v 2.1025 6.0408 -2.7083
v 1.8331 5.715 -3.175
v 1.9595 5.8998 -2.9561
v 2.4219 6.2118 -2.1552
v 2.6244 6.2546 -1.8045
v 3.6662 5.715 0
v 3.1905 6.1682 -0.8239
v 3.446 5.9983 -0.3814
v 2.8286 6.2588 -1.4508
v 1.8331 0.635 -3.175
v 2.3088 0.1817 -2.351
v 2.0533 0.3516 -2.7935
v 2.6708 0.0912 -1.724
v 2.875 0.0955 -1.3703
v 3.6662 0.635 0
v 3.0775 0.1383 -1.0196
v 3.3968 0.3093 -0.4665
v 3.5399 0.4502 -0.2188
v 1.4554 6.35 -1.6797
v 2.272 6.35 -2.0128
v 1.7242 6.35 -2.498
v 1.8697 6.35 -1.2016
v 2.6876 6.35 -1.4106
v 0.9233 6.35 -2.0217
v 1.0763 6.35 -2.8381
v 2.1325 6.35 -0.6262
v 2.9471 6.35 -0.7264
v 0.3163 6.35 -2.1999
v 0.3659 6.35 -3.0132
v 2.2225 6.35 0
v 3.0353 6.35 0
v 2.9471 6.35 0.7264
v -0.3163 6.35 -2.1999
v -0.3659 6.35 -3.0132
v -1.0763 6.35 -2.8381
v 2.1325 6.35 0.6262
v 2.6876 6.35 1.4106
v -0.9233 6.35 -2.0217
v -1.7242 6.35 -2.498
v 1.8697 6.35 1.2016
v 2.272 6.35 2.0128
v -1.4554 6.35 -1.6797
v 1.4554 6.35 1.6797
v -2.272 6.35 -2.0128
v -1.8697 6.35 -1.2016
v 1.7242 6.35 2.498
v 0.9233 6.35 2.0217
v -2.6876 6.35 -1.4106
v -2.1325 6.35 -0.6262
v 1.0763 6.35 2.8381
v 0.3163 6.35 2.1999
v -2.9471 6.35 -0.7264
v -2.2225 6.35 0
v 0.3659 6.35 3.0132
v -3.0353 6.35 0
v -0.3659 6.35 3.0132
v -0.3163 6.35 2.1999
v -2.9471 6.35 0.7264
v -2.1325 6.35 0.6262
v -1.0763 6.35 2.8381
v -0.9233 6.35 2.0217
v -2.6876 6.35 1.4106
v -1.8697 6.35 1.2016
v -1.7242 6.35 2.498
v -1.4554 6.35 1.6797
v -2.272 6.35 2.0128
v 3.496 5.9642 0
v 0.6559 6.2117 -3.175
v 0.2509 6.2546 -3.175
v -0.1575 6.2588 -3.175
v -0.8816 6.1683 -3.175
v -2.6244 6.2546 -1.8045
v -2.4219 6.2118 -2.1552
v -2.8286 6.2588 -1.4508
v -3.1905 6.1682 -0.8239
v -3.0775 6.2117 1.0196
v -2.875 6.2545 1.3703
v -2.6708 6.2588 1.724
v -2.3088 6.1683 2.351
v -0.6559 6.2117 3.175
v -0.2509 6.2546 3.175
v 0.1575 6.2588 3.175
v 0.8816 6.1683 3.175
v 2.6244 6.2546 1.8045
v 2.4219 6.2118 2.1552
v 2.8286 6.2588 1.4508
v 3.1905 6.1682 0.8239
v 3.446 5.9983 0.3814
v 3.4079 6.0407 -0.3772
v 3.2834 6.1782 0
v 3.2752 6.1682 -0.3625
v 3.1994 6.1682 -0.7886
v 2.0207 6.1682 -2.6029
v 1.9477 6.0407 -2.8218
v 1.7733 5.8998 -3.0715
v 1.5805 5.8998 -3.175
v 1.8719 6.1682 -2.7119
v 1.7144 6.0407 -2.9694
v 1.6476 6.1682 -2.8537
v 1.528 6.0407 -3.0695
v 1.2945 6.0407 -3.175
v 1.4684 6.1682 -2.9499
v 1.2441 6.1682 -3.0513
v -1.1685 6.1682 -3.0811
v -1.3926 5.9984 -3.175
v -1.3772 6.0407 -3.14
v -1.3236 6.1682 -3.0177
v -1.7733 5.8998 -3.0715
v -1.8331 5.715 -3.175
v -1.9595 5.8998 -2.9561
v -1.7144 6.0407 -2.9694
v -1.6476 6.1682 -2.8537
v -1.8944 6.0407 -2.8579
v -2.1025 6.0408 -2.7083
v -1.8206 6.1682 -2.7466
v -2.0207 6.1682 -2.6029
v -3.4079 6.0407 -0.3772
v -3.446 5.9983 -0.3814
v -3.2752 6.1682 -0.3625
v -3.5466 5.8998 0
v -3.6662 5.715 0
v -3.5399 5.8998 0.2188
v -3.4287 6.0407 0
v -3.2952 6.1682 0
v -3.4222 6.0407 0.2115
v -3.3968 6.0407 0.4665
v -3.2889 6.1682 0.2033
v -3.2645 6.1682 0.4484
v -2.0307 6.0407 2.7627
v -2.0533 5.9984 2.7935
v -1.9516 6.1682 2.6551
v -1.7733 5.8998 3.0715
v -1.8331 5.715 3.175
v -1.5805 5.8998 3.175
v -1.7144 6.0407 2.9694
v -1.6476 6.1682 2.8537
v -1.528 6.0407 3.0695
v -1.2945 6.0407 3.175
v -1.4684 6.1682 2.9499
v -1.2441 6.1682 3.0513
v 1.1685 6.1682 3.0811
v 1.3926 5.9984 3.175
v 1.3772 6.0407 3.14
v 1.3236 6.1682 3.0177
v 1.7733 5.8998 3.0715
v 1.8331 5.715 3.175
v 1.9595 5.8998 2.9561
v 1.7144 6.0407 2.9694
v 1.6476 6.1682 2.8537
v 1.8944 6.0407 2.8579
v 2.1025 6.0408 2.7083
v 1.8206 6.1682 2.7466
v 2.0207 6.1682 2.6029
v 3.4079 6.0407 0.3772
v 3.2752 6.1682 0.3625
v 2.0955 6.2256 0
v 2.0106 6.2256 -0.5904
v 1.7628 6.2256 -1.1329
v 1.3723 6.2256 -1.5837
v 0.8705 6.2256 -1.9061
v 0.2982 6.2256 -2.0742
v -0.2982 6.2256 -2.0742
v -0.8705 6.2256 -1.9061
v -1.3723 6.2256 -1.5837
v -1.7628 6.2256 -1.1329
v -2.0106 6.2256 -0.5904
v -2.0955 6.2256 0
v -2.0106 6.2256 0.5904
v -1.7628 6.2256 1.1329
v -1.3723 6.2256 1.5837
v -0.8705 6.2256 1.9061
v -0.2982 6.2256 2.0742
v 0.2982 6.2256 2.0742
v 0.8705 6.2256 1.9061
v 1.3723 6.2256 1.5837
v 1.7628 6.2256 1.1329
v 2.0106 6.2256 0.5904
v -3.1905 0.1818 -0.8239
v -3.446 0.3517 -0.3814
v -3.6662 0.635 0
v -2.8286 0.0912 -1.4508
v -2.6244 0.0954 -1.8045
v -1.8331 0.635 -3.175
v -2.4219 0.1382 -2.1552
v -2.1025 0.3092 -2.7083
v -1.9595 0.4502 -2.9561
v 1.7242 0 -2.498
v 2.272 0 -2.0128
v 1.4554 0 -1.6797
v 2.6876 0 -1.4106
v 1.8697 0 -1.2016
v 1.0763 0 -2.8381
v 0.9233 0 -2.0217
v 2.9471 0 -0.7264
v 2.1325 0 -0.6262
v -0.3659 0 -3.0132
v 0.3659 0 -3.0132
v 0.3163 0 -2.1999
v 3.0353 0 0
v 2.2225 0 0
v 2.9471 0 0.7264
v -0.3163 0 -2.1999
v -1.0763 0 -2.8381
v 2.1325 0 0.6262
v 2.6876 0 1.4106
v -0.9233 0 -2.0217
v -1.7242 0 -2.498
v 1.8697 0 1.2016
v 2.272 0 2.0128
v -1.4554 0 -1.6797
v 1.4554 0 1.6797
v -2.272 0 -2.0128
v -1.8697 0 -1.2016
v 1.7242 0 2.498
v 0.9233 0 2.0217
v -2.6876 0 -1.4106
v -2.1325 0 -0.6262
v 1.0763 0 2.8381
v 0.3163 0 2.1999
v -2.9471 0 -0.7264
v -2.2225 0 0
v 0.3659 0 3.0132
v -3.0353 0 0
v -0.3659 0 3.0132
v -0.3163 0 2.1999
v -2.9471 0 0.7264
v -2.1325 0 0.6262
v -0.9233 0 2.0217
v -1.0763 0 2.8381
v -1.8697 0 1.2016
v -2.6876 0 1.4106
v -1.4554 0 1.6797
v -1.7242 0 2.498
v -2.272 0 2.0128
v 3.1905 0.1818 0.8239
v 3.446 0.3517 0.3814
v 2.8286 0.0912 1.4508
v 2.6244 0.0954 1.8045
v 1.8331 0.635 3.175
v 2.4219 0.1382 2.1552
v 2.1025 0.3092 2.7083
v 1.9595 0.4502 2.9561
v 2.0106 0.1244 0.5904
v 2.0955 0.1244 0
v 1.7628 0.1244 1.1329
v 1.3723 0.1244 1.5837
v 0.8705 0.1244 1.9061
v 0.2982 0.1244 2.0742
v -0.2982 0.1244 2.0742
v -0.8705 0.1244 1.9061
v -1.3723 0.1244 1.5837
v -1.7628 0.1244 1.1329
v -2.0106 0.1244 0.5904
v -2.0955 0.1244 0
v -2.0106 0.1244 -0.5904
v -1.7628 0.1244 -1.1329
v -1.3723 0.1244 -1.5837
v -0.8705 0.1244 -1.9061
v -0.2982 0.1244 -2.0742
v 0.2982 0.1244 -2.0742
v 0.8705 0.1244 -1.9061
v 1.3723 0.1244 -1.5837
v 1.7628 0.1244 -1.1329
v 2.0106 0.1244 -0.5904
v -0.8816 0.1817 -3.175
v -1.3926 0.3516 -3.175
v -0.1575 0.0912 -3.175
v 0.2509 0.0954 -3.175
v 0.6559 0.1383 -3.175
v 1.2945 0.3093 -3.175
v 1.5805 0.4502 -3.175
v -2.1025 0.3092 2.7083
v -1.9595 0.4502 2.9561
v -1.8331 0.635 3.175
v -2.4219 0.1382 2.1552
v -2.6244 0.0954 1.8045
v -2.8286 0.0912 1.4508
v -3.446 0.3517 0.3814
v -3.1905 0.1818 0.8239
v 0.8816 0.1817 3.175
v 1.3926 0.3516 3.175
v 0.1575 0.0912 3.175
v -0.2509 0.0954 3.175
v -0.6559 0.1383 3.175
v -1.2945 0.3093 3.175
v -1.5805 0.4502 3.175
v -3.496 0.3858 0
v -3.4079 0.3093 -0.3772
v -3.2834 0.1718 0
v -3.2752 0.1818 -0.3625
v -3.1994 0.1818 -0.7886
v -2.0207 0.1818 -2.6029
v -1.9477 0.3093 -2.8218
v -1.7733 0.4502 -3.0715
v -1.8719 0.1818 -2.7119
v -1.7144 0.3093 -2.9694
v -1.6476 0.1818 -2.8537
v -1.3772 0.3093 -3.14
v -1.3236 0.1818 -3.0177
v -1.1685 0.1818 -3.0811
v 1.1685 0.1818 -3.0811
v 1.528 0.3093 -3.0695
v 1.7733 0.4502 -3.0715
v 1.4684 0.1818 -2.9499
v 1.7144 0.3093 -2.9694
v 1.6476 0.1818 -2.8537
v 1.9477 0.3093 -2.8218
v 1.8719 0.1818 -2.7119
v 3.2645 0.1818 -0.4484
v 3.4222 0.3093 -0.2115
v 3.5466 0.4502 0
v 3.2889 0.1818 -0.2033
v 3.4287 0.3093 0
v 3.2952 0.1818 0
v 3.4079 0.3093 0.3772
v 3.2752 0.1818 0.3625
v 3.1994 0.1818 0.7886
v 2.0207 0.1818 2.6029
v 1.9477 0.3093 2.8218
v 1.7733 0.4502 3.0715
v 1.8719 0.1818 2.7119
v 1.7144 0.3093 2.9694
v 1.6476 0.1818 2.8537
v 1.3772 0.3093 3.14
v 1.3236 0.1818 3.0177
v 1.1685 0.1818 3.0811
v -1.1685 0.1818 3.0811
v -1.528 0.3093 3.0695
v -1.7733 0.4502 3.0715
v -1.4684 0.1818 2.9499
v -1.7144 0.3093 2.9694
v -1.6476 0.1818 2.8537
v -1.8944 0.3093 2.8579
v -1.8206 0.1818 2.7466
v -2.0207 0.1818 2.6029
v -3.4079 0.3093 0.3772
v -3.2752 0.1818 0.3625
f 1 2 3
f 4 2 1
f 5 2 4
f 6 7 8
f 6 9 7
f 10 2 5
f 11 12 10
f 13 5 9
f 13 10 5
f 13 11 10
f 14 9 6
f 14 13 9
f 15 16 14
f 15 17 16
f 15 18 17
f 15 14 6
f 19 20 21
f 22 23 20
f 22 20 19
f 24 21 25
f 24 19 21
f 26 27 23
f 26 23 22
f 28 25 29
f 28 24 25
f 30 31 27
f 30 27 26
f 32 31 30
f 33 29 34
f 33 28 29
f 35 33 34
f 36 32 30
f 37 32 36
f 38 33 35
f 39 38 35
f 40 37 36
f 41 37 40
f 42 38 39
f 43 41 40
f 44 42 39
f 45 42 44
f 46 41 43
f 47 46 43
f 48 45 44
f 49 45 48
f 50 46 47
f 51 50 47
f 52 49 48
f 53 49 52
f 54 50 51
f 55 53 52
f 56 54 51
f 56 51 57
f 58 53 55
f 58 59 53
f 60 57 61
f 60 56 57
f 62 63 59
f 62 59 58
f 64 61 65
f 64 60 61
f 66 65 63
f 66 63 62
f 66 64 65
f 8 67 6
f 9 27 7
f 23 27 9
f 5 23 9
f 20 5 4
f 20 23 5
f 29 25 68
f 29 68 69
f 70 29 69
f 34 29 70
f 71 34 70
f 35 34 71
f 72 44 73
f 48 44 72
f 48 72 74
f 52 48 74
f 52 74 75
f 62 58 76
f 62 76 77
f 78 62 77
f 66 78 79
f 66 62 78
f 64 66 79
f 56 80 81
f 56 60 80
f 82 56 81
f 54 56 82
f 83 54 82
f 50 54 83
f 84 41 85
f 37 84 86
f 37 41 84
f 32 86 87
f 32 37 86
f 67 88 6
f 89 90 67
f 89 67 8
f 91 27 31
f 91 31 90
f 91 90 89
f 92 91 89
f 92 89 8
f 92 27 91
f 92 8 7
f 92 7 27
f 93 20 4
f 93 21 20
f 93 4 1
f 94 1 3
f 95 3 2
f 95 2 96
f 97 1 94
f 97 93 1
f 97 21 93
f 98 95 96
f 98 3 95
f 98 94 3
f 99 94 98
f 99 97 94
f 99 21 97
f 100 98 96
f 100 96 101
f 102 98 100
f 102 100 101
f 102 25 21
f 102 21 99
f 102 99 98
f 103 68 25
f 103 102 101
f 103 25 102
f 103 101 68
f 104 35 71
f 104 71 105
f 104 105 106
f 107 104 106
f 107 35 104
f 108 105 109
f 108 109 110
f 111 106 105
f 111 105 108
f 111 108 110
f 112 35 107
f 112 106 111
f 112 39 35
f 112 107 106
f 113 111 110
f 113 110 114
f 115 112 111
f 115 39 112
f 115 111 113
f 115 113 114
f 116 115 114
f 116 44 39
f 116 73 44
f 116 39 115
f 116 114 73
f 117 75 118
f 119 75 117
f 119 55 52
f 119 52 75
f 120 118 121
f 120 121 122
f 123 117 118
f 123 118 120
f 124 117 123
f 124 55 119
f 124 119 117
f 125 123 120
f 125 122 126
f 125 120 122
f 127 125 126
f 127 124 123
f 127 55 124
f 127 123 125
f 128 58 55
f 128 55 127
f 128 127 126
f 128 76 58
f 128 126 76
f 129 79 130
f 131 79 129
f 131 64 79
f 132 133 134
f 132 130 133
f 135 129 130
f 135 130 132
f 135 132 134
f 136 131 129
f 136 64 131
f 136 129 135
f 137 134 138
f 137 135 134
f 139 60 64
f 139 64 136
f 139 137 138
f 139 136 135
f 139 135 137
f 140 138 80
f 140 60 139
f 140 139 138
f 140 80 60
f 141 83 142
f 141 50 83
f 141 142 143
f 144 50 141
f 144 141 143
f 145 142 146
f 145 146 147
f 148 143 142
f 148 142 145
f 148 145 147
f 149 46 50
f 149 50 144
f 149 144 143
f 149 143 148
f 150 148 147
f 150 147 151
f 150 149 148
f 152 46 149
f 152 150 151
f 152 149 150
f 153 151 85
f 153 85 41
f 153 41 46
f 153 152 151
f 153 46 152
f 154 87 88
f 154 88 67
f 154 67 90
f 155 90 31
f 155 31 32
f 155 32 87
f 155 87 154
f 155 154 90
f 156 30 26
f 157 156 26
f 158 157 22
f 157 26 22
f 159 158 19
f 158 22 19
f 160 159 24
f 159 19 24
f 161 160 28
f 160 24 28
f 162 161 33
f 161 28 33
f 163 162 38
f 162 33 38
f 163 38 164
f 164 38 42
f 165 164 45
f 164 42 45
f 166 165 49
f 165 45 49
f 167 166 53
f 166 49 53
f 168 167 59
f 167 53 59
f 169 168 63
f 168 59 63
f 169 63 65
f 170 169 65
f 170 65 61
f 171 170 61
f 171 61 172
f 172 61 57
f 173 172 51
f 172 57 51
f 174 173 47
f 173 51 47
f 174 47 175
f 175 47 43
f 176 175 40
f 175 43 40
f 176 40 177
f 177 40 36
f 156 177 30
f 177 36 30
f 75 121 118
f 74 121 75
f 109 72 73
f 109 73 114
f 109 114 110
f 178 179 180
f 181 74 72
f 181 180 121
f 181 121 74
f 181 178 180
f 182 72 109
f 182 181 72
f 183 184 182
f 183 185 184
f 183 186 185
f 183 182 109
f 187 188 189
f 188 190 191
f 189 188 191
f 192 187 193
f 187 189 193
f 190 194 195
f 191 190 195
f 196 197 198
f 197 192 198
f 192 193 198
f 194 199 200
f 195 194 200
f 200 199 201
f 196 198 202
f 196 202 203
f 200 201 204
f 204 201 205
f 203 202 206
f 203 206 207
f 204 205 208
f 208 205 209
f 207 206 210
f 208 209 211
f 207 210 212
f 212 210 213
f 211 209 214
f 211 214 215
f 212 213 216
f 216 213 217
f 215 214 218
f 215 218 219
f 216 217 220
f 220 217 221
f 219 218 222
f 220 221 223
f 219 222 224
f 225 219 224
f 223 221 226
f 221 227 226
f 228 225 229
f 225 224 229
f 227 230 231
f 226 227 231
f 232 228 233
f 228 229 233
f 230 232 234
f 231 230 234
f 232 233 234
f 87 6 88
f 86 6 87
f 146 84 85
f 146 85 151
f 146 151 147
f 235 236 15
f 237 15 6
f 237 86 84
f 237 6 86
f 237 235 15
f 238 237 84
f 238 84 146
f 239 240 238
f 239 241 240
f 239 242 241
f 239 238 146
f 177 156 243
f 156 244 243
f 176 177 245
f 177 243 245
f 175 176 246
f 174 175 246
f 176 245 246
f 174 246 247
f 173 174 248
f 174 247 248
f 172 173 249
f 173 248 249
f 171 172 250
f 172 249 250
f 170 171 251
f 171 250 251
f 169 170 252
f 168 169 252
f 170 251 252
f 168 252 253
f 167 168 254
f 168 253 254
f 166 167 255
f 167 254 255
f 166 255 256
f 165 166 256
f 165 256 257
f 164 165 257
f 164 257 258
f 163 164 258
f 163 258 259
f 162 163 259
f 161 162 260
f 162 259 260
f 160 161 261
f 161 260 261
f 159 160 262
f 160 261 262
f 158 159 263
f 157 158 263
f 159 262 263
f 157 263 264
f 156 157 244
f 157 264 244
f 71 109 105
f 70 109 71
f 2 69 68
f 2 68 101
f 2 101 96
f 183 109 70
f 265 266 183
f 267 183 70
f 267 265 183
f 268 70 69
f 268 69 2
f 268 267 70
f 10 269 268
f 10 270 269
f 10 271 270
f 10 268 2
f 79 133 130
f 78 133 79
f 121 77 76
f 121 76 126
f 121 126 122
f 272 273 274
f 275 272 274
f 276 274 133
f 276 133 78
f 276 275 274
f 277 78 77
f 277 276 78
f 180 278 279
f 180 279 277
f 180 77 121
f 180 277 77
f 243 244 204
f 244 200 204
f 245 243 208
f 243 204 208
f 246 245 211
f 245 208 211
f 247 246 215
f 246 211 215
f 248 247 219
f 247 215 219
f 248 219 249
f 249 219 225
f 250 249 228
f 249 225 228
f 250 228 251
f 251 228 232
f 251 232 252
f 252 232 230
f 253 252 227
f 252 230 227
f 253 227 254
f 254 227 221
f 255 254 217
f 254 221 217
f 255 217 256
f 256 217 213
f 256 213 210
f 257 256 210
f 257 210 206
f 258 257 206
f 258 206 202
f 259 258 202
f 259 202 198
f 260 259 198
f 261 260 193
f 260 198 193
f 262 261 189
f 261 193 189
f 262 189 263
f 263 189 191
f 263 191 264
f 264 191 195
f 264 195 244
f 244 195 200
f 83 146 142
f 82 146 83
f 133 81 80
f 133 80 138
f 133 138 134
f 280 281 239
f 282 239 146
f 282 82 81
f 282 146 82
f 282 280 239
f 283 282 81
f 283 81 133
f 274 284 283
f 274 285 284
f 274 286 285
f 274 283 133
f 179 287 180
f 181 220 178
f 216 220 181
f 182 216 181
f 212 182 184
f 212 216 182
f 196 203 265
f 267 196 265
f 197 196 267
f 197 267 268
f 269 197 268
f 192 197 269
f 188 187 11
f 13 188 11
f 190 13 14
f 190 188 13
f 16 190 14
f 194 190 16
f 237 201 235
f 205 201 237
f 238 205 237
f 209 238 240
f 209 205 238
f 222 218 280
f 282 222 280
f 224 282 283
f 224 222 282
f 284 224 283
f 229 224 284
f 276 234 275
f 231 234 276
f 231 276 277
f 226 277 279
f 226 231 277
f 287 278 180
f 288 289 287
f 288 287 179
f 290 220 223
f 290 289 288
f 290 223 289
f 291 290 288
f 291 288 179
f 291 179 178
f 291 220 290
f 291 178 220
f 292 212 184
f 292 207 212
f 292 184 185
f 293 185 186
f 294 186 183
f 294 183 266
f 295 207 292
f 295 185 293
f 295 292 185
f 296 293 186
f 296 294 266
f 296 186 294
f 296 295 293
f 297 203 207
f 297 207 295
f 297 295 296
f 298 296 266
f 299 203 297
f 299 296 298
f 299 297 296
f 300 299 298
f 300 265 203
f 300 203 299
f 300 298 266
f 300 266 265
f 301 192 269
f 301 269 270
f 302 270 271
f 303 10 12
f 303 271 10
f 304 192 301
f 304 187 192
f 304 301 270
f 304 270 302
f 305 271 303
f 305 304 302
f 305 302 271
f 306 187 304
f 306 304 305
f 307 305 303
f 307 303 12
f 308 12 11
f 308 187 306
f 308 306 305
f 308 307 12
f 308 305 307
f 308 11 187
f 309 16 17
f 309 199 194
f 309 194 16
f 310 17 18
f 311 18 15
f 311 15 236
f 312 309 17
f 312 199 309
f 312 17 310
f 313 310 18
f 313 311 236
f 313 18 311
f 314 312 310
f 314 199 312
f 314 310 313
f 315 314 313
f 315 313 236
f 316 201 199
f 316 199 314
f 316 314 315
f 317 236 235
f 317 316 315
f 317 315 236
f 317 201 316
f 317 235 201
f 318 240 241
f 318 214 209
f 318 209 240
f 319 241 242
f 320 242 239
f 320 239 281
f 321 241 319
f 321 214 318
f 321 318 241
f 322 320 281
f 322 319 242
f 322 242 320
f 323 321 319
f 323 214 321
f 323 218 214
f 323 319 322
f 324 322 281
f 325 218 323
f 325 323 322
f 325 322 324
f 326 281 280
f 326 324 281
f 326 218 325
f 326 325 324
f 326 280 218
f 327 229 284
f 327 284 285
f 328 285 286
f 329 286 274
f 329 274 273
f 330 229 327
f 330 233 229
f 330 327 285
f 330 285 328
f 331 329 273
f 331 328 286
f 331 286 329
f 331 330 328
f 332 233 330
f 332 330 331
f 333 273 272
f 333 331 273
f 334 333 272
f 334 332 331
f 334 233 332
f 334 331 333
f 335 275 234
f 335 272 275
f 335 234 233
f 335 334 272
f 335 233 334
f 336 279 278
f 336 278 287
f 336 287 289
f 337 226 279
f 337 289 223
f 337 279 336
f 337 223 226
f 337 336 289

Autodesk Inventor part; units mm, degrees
ref_plane "YZ Plane" through (0, 0, 0) normal (1, 0, 0) x (0, 1, 0)
ref_plane "XZ Plane" through (0, 0, 0) normal (0, 1, 0) x (-1, 0, 0)
ref_plane "XY Plane" through (0, 0, 0) normal (0, 0, 1) x (1, 0, 0)
sketch "Sketch1" plane through (0, 0, 0) normal (0, 1, 0) x (-1, 0, 0)
  line L0 (-1.8331, -3.175) -> (-3.6662, 0)
  line L1 (-3.6662, 0) -> (-1.8331, 3.175)
  line L2 (-1.8331, 3.175) -> (1.8331, 3.175)
  line L3 (1.8331, 3.175) -> (3.6662, 0)
  line L4 (3.6662, 0) -> (1.8331, -3.175)
  line L5 (1.8331, -3.175) -> (-1.8331, -3.175)
  point P0 (0, 0)
  point P1 (0, 0)
  dimension "d0" = 6.35
extrude "Body" add sketch "Sketch1" along normal blind 6.35
sketch "Sketch2" plane through (0, 6.35, 0) normal (0, 1, 0) x (1, 0, 0)
  circle A0 centre (0, 0) radius 2.0955
  dimension "d3" = 4.191
extrude "Hole 2" [suppressed]
sketch "Sketch3" plane through (0, 0, 0) normal (0, -1, 0) x (1, 0, 0)
  circle A0 centre (0, 0) radius 2.0955
  dimension "d6" = 4.191
extrude "Hole 1" cut sketch "Sketch3" against normal blind 12.7
chamfer "Hole 2 Chamfer 1" [suppressed]
chamfer "Hole 1 Chamfer 1" distance 0.127 distance2 0.1244 1 edges at (-2.0955, 0, 0) measured on face at (-0.0842, 0, 2.8101)
sketch "Sketch4" plane through (0, 0, 0) normal (0, 0, 1) x (1, 0, 0)
  line L0 (1.8331, 6.35) -> (-1.8331, 6.35) projected
  line L1 (0, 6.35) -> (-3.0353, 6.35)
  line L2 (-3.6662, 6.35) -> (-1.8331, 6.35) projected
  line L3 (-3.6662, 0) -> (-3.6662, 6.35) projected
  arc A0 (-3.0353, 6.35) -> (-3.6662, 5.715) centre (-2.2234, 4.9124) ccw
  line L4 (-3.6662, 5.715) -> (-6.3588, 8.3147)
  line L5 (-6.3588, 8.3147) -> (0, 6.35)
  line L6 (0, 6.35) -> (0, -3.486)
  point P0 (0, 0)
  dimension "d15" = 3.0353
  dimension "d16" = 1.651
  dimension "d17" = 0.635
revolve "Hole 2 Chamfer 2" [suppressed]
sketch "Sketch5" plane through (0, 0, 0) normal (0, 0, 1) x (1, 0, 0)
  line L0 (0, 0) -> (-3.0353, 0)
  line L1 (1.8331, 0) -> (-1.8331, 0) projected
  line L2 (-3.6662, 0) -> (-3.6662, 6.35) projected
  arc A0 (-3.6662, 0.635) -> (-3.0353, 0) centre (-2.2234, 1.4376) ccw
  line L3 (0, 0) -> (0, -2.1986)
  line L4 (-3.6662, 0.635) -> (-4.1154, -0.8715)
  line L5 (-4.1154, -0.8715) -> (0, 0)
  point P0 (-3.6662, 18.415)
  dimension "d19" = 3.0353
  dimension "d20" = 1.651
  dimension "d21" = 0.635
revolve "Hole 1 Chamfer 2" cut sketch "Sketch5" angle 360 about axis through (0, 0, 0) along (0, -1, 0)
chamfer "Hole 2 Chamfer 1 For Short" distance 0.127 distance2 0.1244 1 edges at (-2.0955, 6.35, 0) measured on face at (-0.0842, 6.35, 2.8101)
sketch "Sketch7" plane through (0, 0, 0) normal (0, 0, 1) x (1, 0, 0)
  line L0 (0, 6.3504) -> (3.0353, 6.35)
  line L1 (3.6662, 6.35) -> (1.8331, 6.35) projected
  line L2 (3.6662, 0.635) -> (3.6662, 6.35) projected
  arc A0 (3.6662, 5.715) -> (3.0353, 6.35) centre (2.2234, 4.9124) ccw
  line L3 (3.6662, 5.715) -> (4.2663, 7.2532)
  line L4 (4.2663, 7.2532) -> (0, 6.3504)
  line L5 (0, 8.1561) -> (0, 6.3504)
  line L6 (1.8331, 6.35) -> (-1.8331, 6.35) projected
  point P0 (0, 0)
  point P1 (0, 6.35)
  dimension "d33" = 3.0353
  dimension "d34" = 1.651
  dimension "d35" = 0.635
revolve "Hole 2 Chamfer 2 For Short" cut sketch "Sketch7" angle 360 about axis through (0, 8.1561, 0) along (0, -1, 0)
properties part number "Standoff .5" material "VEX Aluminum Alloy 5052-H32"
